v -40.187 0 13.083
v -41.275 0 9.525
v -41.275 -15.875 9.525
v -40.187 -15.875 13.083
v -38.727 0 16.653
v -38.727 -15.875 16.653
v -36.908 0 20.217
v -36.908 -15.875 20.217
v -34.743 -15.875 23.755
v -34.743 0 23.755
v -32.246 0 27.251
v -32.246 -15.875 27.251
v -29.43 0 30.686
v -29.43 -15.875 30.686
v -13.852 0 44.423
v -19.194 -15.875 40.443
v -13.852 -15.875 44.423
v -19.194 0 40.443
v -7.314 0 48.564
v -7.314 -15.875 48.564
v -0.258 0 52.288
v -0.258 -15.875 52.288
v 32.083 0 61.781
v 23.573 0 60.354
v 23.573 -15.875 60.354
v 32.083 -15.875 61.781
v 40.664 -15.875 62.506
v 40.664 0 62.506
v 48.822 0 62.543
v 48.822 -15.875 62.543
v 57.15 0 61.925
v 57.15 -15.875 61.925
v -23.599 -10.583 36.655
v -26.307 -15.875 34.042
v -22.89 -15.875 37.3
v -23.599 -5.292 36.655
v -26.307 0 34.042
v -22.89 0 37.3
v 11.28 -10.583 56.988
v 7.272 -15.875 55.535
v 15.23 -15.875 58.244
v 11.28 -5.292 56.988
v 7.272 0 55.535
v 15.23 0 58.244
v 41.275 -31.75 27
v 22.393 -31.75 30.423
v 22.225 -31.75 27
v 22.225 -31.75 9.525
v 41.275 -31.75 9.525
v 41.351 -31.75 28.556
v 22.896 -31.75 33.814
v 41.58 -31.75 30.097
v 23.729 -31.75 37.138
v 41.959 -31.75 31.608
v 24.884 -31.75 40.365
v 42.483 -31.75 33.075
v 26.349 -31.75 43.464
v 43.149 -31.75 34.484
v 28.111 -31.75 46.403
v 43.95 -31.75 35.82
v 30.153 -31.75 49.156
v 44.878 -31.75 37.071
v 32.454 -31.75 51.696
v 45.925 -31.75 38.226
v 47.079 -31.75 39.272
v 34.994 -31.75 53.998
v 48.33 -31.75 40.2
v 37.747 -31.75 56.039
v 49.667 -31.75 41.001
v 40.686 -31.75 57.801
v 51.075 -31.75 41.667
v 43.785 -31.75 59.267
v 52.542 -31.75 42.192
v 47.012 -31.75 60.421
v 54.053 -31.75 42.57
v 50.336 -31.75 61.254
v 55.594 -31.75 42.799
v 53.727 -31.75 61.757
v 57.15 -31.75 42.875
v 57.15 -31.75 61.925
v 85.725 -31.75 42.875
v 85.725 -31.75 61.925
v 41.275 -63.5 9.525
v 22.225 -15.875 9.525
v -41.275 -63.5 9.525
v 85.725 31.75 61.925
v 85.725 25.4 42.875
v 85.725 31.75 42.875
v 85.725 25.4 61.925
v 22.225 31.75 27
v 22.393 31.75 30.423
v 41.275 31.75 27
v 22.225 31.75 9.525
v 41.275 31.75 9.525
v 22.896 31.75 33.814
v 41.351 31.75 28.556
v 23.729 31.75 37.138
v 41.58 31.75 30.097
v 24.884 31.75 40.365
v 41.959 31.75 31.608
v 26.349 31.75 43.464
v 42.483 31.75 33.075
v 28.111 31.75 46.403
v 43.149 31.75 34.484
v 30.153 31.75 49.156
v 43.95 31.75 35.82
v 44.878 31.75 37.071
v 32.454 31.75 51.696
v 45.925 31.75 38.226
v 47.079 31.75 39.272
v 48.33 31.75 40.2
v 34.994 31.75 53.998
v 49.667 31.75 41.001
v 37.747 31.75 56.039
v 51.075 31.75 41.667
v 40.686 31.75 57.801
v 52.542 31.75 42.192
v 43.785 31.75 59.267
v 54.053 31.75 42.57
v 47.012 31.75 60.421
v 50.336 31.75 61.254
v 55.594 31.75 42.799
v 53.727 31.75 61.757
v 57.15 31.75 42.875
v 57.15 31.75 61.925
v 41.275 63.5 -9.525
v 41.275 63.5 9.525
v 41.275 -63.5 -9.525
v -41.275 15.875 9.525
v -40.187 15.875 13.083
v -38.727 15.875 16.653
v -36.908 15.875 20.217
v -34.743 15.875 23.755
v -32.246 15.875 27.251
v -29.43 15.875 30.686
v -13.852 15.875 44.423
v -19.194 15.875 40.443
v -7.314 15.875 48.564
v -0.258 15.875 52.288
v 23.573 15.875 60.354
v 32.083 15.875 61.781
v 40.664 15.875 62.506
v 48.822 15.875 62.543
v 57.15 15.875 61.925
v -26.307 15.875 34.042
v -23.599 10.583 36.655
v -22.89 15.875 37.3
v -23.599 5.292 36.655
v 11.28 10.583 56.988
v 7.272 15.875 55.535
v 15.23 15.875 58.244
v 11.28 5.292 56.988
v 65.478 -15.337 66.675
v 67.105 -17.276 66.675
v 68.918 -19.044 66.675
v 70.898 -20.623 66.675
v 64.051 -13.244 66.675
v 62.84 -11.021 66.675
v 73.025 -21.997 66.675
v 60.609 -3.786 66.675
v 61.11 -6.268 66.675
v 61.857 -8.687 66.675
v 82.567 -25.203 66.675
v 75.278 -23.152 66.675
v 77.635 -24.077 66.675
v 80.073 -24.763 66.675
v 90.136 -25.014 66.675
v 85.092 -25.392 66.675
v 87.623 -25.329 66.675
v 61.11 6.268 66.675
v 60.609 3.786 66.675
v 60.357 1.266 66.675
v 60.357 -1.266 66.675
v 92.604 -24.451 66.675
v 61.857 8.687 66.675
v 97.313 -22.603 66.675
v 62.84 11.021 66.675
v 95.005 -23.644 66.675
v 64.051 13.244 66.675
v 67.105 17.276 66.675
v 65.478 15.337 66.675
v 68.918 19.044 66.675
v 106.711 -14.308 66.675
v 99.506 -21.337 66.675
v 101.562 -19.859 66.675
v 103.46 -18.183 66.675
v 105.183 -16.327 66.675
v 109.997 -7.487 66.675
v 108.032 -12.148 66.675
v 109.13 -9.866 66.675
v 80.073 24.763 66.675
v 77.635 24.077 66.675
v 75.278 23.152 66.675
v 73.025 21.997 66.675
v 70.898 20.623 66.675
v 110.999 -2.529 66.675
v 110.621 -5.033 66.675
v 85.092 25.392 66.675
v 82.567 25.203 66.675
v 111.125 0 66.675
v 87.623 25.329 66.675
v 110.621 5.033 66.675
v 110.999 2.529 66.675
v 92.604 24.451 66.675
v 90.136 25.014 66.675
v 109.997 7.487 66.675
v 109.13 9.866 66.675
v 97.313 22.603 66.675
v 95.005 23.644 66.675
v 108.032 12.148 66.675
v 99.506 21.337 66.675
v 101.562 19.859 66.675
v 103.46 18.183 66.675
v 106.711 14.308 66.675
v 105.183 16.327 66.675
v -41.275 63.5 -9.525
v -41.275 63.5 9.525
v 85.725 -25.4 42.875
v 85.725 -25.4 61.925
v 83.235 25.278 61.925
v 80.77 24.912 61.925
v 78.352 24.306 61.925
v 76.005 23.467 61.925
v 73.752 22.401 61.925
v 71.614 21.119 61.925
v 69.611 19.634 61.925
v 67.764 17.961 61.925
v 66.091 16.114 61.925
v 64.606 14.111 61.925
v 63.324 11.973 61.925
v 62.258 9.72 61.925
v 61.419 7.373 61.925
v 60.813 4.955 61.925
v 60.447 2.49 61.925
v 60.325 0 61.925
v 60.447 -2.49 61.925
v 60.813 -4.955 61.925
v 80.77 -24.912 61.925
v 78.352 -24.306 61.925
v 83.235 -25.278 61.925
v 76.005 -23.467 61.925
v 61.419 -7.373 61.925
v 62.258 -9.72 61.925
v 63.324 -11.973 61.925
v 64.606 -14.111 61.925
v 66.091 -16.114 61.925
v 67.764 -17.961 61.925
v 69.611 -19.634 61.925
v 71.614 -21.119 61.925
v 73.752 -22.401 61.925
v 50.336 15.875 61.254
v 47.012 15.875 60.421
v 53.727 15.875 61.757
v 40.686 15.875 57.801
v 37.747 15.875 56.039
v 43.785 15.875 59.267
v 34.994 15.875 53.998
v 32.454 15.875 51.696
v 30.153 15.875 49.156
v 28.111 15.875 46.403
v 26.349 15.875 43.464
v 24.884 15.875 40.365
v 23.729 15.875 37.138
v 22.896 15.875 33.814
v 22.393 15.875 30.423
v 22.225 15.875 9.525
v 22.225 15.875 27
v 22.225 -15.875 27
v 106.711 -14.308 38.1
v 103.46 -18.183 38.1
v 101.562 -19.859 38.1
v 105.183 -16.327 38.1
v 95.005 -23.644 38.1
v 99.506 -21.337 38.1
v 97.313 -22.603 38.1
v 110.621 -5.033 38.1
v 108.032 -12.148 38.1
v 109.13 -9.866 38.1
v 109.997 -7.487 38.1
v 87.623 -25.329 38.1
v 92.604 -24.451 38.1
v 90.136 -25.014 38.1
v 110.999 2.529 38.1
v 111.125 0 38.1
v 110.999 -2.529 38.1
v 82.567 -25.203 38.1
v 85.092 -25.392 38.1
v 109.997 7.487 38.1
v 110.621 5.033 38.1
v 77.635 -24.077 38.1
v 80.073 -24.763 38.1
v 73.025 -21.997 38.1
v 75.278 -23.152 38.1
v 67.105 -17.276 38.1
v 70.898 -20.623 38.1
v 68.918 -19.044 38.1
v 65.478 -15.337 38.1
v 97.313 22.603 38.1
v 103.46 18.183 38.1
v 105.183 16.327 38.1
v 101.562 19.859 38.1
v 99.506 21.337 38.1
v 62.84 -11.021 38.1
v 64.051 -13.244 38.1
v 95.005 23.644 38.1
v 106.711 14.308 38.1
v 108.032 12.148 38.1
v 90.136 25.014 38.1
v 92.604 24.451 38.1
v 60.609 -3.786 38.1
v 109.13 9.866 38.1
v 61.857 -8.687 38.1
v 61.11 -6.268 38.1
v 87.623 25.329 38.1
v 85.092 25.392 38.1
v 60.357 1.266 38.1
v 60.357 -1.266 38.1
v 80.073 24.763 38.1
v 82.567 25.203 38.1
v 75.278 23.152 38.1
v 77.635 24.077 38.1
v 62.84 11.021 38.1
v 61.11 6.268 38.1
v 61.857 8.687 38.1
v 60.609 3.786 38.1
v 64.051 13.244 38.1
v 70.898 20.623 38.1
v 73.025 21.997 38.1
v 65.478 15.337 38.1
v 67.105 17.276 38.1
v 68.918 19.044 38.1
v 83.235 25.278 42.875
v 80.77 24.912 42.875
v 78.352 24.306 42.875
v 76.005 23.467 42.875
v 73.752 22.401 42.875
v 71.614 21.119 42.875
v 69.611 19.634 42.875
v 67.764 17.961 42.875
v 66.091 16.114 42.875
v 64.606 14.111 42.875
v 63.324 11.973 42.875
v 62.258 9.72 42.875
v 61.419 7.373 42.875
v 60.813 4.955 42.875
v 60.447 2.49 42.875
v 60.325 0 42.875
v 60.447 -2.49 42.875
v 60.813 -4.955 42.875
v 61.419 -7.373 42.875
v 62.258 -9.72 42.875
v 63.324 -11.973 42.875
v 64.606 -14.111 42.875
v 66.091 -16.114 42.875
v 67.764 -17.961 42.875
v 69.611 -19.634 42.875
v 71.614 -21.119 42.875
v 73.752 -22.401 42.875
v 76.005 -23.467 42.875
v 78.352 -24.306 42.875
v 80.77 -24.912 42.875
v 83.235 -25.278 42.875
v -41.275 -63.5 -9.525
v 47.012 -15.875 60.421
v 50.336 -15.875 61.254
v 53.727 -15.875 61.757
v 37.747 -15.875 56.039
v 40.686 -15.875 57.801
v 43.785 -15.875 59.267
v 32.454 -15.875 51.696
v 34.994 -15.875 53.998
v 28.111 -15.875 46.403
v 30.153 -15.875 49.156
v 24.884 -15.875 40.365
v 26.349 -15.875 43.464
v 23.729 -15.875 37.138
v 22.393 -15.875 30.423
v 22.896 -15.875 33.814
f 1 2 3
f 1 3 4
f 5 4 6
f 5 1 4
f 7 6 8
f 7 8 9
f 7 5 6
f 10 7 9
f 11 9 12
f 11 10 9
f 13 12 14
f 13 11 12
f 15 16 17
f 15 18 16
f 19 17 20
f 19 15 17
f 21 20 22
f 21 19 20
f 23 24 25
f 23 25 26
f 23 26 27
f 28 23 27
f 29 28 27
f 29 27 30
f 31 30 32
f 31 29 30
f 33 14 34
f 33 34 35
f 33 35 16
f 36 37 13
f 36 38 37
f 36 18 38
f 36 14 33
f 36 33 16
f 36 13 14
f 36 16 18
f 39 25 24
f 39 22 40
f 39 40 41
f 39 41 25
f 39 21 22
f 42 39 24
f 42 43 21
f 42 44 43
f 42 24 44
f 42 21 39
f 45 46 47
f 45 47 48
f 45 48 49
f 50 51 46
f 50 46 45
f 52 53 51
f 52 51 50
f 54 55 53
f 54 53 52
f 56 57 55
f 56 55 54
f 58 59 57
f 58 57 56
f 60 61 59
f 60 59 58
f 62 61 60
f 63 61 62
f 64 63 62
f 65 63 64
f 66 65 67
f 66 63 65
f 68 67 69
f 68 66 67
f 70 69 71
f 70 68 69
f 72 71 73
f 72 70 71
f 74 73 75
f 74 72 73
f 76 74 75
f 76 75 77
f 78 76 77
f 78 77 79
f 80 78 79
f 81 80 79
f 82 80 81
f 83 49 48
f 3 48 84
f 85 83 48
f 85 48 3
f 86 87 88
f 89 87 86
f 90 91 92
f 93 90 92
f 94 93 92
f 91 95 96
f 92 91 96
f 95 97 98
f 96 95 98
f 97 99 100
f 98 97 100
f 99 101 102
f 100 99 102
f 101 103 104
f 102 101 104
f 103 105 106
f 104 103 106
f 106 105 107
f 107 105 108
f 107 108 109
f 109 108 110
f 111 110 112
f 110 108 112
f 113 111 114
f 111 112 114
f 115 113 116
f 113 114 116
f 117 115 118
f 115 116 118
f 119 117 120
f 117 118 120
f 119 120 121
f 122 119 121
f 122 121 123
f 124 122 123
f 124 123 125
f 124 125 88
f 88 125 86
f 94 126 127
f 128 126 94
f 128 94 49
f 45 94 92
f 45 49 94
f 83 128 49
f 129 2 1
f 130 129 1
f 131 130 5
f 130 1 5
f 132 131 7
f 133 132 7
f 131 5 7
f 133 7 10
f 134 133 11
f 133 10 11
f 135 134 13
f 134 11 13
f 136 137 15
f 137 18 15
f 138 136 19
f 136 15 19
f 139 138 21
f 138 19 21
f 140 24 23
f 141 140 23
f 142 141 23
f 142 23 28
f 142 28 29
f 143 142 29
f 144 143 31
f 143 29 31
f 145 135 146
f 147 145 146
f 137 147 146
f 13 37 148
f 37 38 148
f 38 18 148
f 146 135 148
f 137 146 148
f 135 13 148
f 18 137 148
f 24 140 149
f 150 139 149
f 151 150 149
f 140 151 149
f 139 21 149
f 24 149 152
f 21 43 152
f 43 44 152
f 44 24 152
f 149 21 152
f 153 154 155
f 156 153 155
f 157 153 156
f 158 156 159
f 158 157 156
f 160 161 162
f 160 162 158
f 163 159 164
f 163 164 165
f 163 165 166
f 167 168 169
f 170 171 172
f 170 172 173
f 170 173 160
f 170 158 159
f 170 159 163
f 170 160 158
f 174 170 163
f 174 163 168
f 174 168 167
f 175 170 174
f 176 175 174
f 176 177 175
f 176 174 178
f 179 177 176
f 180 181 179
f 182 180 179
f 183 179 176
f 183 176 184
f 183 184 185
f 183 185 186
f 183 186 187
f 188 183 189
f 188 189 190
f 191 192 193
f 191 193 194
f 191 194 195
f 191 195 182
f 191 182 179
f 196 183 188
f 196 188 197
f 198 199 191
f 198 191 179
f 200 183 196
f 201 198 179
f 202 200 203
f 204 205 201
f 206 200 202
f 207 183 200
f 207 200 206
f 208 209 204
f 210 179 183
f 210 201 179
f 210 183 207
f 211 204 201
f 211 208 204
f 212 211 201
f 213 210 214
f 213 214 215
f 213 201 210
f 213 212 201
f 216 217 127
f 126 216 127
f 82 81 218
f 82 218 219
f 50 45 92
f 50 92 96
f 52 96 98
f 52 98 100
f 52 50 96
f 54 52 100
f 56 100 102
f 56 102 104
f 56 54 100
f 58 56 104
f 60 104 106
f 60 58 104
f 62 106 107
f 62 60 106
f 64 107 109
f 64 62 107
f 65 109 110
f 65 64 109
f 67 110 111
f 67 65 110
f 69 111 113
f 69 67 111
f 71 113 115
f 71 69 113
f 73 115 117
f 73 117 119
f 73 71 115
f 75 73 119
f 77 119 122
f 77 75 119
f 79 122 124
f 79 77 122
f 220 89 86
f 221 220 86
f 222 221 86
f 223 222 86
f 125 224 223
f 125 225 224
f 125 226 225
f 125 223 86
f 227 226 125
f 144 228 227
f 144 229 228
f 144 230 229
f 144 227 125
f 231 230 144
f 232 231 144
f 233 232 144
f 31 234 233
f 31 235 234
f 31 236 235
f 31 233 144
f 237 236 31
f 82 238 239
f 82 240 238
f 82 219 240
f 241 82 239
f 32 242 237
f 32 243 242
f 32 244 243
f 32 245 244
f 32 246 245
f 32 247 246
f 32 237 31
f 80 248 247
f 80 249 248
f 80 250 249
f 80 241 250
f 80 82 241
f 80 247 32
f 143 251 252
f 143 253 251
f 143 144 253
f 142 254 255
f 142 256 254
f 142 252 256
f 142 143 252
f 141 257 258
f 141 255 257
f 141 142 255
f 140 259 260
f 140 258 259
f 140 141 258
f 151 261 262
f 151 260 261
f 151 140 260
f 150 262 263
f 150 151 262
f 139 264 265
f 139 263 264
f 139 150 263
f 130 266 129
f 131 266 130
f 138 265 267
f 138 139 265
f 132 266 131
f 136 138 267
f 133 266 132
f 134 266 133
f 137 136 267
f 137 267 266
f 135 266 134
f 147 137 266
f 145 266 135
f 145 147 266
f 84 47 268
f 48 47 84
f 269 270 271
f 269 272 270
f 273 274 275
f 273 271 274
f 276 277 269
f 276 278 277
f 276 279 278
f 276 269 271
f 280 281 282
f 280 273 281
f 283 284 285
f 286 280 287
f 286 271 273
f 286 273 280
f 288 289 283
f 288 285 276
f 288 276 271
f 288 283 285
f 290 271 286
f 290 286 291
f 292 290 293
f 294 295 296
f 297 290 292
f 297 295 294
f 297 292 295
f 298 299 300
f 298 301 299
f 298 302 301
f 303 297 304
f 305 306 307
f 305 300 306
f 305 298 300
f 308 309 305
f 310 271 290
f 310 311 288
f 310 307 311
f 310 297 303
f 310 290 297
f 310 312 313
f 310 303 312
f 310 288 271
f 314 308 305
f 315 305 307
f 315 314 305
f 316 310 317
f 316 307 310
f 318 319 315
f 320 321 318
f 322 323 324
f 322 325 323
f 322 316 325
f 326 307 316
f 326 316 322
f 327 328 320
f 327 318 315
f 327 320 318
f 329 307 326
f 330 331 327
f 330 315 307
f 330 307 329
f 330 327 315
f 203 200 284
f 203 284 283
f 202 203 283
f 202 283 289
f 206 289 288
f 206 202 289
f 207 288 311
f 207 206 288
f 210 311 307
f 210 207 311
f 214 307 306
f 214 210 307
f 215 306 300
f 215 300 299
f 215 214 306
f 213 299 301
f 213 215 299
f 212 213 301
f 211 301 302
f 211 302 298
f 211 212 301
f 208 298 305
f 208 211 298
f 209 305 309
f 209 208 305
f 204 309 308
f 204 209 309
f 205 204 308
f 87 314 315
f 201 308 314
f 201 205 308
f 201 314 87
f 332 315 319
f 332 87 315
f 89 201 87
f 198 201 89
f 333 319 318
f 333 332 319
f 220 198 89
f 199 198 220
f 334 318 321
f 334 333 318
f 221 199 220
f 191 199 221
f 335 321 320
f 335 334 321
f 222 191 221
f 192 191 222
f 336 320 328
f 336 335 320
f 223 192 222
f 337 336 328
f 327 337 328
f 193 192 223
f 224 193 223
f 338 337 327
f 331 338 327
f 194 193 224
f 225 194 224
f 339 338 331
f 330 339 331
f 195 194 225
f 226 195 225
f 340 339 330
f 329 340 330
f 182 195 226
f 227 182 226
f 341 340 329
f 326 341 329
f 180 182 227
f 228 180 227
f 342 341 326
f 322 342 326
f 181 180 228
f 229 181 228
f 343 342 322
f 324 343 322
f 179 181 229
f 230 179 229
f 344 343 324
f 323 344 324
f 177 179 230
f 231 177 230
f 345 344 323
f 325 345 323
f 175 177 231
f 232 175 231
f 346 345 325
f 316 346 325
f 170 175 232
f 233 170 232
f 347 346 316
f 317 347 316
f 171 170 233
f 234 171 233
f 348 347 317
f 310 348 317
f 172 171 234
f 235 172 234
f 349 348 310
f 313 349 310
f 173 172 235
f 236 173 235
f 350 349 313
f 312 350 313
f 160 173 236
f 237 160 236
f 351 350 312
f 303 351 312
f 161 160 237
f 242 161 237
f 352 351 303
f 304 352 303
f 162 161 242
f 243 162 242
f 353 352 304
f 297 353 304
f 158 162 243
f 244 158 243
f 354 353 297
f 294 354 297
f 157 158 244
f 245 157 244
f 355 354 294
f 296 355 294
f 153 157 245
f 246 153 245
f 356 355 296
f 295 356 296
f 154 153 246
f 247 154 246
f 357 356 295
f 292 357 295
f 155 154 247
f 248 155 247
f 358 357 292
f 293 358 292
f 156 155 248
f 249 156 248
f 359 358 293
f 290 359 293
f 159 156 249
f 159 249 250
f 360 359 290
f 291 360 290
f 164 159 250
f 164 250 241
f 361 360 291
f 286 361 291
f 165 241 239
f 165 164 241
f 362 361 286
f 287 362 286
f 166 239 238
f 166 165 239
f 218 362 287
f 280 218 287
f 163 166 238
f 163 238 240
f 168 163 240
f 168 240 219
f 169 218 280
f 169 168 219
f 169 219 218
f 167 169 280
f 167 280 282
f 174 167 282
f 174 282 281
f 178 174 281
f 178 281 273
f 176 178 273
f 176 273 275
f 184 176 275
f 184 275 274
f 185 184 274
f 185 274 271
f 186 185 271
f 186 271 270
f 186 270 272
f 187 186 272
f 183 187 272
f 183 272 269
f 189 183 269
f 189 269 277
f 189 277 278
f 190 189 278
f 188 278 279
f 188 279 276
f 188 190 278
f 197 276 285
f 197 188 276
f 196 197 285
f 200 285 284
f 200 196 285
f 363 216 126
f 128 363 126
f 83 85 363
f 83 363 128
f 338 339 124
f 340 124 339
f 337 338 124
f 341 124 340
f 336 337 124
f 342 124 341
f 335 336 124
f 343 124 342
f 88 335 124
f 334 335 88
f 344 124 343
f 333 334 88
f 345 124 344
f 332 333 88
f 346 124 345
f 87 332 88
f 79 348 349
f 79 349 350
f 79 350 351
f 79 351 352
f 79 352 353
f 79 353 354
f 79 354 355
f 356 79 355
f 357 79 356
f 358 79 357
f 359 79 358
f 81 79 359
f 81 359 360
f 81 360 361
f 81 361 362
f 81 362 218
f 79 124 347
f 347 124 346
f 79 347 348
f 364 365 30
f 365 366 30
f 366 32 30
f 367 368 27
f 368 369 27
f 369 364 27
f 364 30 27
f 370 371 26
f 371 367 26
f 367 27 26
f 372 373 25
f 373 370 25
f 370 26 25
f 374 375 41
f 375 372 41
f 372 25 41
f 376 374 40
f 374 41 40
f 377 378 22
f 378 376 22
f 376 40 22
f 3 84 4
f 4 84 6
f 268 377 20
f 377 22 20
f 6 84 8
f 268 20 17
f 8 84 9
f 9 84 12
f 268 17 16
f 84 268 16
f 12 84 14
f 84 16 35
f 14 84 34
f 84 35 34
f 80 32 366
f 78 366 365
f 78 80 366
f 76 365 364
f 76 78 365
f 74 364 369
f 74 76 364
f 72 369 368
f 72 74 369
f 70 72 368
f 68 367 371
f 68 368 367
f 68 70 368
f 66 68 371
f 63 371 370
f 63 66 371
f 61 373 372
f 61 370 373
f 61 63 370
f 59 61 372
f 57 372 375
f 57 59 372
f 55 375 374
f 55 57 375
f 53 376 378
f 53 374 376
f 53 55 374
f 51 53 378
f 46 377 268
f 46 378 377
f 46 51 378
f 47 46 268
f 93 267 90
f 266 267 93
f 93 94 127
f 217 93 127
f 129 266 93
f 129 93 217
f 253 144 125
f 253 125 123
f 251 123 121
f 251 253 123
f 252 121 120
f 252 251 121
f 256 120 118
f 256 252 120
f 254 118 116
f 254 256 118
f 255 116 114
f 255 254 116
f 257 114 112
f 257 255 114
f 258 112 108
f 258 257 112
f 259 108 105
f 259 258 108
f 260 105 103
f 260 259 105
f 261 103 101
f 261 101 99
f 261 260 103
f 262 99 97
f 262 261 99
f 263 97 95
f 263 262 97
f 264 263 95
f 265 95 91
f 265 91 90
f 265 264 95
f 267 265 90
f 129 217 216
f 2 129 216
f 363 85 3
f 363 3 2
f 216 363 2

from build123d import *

# Parameters (mm, degrees)
F1_DEPTH = 63.5
F0_W     = 25.4
F0_H     = 19.05
F2_DEPTH = 31.75
F4_DEPTH = 15.875


with BuildPart() as f1:
    # F0 (on Front) → F1 (new body, symmetric)
    with BuildSketch(Plane.XZ):
        Polygon((22.225, 9.525), (-41.275, 9.525), (-41.275, -9.525), (41.275, -9.525), (41.275, 9.525), align=None)
    extrude(amount=F1_DEPTH, both=True)

    # F0 (on Front) → F2 (join, symmetric)
    with BuildSketch(Plane.XZ):
        with BuildLine():
            Line((22.225, 27.0002), (22.225, 9.525))
            Line((22.225, 9.525), (41.275, 9.525))
            Line((41.275, 9.525), (41.275, 27.0002))
            ThreePointArc((41.275, 27.0002), (45.9246798487, 38.2255201513), (57.15, 42.8752))
            Line((57.15, 42.8752), (60.325, 42.8752))
            Line((60.325, 42.8752), (60.325, 61.9252))
            Line((60.325, 61.9252), (57.15, 61.9252))
            ThreePointArc((57.15, 61.9252), (32.4542956671, 51.6959043329), (22.225, 27.0002))
        make_face()
        with Locations((73.025, 52.4002)):
            Rectangle(F0_W, F0_H)
    extrude(amount=F2_DEPTH, both=True)

    # F0 (on Front) → F3 (revolve)
    with BuildSketch(Plane.XZ):
        Polygon((85.725, 66.675), (85.725, 61.9252), (85.725, 42.8752), (85.725, 38.1), (111.125, 38.1), (111.125, 66.675), align=None)
    revolve(axis=Axis((85.725, 0, 52.3875), (0, 0, 1)))

    # F0 (on Front) → F4 (join, symmetric)
    with BuildSketch(Plane.XZ):
        with BuildLine():
            add(Edge.make_bspline(
                [(-41.275, 9.525), (-34.2721380293, 37.1860302985), (7.8561343253, 67.5534531474), (57.15, 61.9252)],
                knots=[0, 0, 0, 0, 111.5045361635, 111.5045361635, 111.5045361635, 111.5045361635], degree=3))
            Line((-41.275, 9.525), (22.225, 9.525))
            Line((22.225, 9.525), (22.225, 27.0002))
            ThreePointArc((22.225, 27.0002), (32.4542956671, 51.6959043329), (57.15, 61.9252))
        make_face()
    extrude(amount=F4_DEPTH, both=True)


solid = f1.part
